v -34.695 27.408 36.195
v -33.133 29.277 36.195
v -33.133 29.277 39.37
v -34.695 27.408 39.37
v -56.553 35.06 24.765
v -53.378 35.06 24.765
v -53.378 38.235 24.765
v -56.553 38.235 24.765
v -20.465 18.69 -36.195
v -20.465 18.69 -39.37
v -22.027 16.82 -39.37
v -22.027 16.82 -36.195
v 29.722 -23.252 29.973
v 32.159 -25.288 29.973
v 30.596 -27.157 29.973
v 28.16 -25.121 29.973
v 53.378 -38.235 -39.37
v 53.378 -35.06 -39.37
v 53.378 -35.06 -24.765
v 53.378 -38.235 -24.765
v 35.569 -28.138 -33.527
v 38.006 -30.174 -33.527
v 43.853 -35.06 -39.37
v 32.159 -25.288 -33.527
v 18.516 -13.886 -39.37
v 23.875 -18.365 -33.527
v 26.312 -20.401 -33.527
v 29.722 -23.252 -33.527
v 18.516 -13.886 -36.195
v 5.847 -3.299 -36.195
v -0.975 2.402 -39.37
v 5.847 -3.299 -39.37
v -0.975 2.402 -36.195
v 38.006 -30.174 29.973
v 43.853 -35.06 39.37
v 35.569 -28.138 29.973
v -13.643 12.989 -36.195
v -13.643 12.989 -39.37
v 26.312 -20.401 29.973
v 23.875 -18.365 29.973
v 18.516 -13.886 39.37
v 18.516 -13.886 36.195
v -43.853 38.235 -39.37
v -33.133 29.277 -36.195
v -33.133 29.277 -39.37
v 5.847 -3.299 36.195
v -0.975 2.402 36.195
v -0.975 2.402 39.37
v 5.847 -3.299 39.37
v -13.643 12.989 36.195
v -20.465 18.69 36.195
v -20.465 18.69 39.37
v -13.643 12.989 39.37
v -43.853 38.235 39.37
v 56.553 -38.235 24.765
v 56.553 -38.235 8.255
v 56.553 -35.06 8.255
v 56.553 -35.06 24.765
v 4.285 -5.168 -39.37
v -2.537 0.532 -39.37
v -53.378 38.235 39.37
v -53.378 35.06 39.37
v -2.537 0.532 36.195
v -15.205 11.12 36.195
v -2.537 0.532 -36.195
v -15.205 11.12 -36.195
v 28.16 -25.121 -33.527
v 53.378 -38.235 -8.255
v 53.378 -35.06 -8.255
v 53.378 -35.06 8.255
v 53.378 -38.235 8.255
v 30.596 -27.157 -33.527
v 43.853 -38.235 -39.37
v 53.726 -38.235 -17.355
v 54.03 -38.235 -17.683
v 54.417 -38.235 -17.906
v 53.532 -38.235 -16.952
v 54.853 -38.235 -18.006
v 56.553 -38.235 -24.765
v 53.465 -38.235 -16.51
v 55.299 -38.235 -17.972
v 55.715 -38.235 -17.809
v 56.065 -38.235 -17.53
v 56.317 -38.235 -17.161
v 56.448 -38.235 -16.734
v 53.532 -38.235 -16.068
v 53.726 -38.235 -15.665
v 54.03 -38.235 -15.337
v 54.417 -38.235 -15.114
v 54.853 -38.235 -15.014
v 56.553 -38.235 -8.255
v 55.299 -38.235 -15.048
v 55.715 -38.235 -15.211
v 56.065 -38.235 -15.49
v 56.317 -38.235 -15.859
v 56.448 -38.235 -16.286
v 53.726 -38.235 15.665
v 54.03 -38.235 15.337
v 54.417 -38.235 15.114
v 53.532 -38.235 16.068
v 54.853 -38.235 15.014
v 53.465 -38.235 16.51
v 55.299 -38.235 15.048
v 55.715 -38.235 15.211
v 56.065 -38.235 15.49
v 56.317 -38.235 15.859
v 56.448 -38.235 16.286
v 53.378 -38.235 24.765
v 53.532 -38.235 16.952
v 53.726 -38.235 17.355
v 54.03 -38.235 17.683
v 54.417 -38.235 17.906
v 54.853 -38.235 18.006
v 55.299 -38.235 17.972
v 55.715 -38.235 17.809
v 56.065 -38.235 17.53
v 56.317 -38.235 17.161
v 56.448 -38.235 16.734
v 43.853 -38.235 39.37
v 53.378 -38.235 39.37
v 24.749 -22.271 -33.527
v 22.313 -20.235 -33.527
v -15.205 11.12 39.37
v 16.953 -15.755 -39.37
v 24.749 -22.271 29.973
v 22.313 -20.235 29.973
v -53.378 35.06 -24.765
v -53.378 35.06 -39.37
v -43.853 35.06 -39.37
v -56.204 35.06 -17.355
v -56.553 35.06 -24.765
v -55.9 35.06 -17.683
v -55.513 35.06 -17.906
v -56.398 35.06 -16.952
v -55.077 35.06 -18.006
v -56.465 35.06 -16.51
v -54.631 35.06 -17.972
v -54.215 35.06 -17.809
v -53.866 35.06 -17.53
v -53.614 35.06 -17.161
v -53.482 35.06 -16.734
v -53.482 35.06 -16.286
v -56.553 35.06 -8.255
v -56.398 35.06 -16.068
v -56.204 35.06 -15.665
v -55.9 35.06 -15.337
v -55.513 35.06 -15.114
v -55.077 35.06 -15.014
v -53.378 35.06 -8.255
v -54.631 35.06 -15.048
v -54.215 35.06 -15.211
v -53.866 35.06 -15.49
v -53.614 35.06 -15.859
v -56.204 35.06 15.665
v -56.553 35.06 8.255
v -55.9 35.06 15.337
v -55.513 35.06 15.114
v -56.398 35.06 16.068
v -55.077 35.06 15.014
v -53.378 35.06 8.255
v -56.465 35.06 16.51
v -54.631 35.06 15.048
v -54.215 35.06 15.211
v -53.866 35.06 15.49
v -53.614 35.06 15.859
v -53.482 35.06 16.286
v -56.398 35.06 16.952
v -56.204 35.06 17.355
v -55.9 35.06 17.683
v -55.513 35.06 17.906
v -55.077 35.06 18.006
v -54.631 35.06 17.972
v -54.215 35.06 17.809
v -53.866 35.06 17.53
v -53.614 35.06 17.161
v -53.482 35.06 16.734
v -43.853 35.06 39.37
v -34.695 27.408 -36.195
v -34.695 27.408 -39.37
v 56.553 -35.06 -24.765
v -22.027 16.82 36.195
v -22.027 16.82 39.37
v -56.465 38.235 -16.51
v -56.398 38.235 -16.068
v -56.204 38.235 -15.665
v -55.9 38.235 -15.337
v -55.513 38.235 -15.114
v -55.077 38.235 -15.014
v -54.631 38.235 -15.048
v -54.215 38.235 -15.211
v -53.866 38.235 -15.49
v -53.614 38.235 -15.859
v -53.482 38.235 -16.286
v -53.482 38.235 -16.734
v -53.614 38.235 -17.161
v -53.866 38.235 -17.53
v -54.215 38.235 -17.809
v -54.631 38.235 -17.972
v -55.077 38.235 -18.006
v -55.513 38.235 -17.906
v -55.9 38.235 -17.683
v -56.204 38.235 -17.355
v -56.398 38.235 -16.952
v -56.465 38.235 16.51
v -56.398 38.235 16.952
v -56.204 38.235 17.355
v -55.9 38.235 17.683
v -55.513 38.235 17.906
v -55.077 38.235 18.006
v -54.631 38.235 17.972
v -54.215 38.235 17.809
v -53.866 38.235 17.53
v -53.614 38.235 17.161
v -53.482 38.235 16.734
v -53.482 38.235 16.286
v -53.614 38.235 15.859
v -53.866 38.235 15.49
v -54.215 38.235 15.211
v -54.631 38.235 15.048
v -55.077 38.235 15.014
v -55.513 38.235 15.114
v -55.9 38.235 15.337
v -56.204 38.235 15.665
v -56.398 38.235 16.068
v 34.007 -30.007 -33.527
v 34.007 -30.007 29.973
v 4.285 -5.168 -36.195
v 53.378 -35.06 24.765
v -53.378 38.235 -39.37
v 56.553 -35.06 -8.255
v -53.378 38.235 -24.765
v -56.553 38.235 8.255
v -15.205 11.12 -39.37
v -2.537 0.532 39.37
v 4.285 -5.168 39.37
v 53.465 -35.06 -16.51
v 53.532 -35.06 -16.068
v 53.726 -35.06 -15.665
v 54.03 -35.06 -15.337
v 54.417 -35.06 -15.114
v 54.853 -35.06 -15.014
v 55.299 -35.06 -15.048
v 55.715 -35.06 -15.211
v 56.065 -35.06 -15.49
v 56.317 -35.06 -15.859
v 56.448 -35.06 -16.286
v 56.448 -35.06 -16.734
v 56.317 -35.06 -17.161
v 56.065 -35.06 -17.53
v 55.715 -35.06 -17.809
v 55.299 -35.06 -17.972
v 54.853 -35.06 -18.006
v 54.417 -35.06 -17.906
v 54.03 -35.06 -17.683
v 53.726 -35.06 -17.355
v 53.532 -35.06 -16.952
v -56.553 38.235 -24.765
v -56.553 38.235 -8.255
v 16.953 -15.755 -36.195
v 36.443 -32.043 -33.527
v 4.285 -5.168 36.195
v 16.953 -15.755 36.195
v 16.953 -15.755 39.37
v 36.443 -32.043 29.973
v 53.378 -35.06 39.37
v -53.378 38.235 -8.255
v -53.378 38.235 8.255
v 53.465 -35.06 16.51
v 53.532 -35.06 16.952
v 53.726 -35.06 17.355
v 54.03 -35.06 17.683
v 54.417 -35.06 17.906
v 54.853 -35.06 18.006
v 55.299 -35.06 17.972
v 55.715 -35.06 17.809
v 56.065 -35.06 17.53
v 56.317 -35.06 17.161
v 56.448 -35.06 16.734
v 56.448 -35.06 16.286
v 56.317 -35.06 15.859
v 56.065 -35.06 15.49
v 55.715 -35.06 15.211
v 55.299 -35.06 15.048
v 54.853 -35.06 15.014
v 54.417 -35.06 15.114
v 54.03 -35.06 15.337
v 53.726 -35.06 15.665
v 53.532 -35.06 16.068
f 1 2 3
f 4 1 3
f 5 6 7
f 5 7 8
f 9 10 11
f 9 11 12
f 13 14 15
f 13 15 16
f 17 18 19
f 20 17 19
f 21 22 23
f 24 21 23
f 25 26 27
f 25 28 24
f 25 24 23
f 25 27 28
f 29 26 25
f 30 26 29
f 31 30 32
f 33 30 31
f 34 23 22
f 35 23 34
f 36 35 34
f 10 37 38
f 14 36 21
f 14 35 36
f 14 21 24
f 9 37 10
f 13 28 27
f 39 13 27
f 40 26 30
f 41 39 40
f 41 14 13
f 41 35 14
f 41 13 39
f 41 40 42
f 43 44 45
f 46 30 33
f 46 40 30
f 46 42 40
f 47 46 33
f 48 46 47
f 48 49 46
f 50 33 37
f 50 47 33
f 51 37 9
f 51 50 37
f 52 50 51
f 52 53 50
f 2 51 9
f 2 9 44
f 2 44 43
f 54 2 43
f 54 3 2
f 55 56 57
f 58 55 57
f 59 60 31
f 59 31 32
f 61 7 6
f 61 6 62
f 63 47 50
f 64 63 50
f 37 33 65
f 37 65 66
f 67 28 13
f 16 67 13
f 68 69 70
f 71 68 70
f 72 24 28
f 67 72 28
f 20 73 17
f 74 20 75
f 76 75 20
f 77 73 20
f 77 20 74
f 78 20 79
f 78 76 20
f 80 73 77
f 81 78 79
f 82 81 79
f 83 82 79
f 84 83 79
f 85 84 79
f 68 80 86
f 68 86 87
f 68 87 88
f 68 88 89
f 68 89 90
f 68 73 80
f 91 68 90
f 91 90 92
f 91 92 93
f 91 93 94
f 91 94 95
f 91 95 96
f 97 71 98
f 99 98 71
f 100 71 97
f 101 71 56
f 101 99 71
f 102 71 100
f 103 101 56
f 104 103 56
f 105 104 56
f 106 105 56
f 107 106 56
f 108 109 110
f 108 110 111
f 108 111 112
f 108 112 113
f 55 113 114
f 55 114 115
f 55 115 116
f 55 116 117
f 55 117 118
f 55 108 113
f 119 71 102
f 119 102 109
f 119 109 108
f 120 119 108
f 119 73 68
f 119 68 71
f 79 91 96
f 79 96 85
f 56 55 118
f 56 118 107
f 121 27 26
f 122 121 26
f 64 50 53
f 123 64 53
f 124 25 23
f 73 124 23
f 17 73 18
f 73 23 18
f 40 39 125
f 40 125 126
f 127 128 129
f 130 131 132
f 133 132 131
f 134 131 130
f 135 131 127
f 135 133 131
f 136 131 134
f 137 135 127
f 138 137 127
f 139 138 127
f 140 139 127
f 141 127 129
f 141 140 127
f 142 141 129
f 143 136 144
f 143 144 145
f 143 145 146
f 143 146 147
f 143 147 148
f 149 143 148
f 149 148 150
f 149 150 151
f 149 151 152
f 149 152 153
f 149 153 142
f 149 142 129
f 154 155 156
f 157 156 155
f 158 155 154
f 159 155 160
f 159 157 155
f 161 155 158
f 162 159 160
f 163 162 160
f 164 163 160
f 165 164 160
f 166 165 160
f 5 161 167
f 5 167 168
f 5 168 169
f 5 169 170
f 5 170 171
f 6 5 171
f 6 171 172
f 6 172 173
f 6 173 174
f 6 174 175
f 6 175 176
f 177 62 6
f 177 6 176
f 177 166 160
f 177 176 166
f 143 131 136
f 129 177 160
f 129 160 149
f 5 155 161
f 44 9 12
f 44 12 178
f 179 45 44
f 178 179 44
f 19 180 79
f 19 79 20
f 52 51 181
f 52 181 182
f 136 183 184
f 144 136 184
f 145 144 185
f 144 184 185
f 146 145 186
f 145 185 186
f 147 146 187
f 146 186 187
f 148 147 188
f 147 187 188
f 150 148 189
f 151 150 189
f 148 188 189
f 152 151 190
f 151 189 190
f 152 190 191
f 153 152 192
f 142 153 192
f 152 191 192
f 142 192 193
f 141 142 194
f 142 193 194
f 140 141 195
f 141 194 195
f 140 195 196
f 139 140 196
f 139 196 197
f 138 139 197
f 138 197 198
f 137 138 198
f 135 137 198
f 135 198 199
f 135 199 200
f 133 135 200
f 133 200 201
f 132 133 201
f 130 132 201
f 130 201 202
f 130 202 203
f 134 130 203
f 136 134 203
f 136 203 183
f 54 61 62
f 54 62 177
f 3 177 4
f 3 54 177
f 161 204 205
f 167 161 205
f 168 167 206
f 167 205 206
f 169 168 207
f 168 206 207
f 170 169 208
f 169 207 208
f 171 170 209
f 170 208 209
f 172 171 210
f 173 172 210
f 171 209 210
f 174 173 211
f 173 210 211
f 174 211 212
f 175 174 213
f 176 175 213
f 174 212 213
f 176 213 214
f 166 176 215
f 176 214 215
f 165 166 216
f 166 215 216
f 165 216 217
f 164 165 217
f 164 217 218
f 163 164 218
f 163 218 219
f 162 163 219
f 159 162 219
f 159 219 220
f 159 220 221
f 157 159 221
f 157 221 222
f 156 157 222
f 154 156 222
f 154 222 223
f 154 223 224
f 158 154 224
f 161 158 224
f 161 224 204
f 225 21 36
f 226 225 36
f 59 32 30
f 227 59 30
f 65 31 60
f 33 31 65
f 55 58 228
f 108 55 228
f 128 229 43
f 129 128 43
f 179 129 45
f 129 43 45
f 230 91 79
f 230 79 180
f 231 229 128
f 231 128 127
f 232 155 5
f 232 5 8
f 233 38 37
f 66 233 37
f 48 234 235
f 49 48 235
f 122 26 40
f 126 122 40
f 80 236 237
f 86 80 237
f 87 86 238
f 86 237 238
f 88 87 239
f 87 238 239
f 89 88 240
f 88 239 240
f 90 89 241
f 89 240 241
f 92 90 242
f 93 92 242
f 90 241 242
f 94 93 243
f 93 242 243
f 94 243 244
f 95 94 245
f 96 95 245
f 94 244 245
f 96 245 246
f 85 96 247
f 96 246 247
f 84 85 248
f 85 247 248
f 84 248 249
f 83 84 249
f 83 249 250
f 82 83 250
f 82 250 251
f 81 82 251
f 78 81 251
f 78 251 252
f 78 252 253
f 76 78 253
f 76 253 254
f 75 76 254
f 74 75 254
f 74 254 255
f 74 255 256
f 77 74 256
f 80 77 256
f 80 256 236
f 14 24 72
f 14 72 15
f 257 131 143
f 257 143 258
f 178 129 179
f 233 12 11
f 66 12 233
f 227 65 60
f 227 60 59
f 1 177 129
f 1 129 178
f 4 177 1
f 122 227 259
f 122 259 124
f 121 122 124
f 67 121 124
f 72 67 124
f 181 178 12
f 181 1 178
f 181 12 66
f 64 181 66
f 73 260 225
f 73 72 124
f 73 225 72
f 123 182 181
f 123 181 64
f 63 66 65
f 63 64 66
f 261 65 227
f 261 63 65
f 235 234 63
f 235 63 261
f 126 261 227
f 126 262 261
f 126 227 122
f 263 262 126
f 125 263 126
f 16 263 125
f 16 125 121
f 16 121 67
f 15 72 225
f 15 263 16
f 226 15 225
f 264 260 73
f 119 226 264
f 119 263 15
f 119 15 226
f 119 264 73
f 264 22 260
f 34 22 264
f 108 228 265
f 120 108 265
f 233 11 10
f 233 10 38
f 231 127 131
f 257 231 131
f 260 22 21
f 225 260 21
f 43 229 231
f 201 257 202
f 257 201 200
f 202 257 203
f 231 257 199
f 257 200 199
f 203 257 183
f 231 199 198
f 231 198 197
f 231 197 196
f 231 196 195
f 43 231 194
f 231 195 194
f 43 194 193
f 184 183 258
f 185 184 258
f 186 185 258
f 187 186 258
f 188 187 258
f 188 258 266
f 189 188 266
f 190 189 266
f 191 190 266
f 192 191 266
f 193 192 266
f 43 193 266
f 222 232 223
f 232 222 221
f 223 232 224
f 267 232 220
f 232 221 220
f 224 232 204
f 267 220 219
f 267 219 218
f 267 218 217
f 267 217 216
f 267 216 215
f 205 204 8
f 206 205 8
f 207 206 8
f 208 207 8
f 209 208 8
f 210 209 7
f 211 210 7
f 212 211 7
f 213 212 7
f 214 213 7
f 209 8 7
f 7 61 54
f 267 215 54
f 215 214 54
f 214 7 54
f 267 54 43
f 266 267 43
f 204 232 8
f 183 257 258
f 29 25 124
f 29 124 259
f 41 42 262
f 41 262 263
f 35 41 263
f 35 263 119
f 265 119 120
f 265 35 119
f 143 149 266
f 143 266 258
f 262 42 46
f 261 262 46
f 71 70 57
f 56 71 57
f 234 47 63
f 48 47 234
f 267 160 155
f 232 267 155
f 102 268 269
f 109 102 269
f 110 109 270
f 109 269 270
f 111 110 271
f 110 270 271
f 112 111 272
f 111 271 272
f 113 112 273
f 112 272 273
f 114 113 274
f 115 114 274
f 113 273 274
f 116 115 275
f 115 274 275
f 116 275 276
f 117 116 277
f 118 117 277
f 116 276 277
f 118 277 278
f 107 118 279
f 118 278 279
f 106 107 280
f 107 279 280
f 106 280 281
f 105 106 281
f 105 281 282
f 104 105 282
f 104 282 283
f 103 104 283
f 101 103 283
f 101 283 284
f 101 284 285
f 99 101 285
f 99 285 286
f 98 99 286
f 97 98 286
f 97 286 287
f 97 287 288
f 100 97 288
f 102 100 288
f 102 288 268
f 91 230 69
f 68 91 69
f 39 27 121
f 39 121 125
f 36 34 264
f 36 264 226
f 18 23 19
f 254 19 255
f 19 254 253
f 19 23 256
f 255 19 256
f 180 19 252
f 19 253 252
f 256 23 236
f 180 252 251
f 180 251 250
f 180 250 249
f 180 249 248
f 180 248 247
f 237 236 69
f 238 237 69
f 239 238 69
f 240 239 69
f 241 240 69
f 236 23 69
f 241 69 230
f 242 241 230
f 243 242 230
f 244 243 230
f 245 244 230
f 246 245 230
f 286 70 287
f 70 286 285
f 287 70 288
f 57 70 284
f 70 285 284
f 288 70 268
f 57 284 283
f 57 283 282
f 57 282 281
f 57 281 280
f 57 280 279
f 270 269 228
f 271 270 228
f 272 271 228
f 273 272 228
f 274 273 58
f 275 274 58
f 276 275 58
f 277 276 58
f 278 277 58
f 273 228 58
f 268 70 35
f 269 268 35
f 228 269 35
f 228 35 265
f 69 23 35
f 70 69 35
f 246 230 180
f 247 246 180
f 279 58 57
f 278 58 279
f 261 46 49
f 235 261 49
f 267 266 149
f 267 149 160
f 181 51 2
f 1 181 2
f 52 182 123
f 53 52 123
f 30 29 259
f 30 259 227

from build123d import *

# Parameters (mm, degrees)
F0_W     = 12.7
F0_H     = 3.175
F1_DEPTH = 39.37
F2_W     = 3.175
F2_H     = 14.605
F2_H_2   = 16.51
F2_R     = 1.5
F3_DEPTH = 25.4
F4_W     = 3.175
F4_H     = 14.605
F4_R     = 1.5
F5_DEPTH = 25.4
F6_W     = 3.175
F6_H     = 63.5
F6_W_2   = 16.51
F6_H_2   = 3.175
F7_DEPTH = 25.4


with BuildPart() as f1:
    # F0 (on Top) → F1 (new body, symmetric)
    with BuildSketch(Plane.XY):
        with Locations((-50.2026024774, 36.647943407)):
            Rectangle(F0_W, F0_H)
        Polygon((-43.8526024774, 38.235443407), (-43.8526024774, 35.060443407), (43.8526024774, -38.235443407), (43.8526024774, -35.060443407), align=None)
        with Locations((50.2026024774, -36.647943407)):
            Rectangle(F0_W, F0_H)
    extrude(amount=F1_DEPTH, both=True)

    # F2 (on face) → F3 (cut)
    with BuildSketch(Plane(origin=(0, 38.235443407, 0), x_dir=(-1, 0, 0), z_dir=(0, 1, 0))):
        with Locations((54.9651024774, 32.0675)):
            Rectangle(F2_W, F2_H)
        with Locations((54.9651024774, 0)):
            Rectangle(F2_W, F2_H_2)
        with Locations((54.9651024774, -32.0675)):
            Rectangle(F2_W, F2_H)
        with Locations((54.9651024774, 16.51)):
            Circle(F2_R)
        with Locations((54.9651024774, -16.51)):
            Circle(F2_R)
    extrude(amount=-F3_DEPTH, mode=Mode.SUBTRACT)

    # F4 (on face) → F5 (cut)
    with BuildSketch(Plane(origin=(0, -35.060443407, 0), x_dir=(-1, 0, 0), z_dir=(0, 1, 0))):
        with Locations((-54.9651024774, 32.0675)):
            Rectangle(F4_W, F4_H)
        with Locations((-54.9651024774, -32.0675)):
            Rectangle(F4_W, F4_H)
        Polygon((-56.5526024774, 8.255), (-56.5526024774, 0), (-56.5526024774, -8.255), (-53.3776024774, -8.255), (-53.3776024774, 8.255), align=None)
        with Locations((-54.9651024774, 16.51)):
            Circle(F4_R)
        with Locations((-54.9651024774, -16.51)):
            Circle(F4_R)
    extrude(amount=-F5_DEPTH, mode=Mode.SUBTRACT)

    # F6 (on face) → F7 (cut)
    with BuildSketch(Plane(origin=(0.7811352648, 0.9346994965, 0), x_dir=(-0.7673246278, 0.6412588523, 0), z_dir=(0.6412588523, 0.7673246278, 0))):
        with Locations((-31.684501572, -1.7767186165)):
            Rectangle(F6_W, F6_H)
        with Locations((-39.304501572, -1.7767186165)):
            Rectangle(F6_W, F6_H)
        with Locations((-46.924501572, -1.7767186165)):
            Rectangle(F6_W, F6_H)
        with Locations((35.942998428, 37.7825)):
            Rectangle(F6_W_2, F6_H_2)
        with Locations((10.542998428, 37.7825)):
            Rectangle(F6_W_2, F6_H_2)
        with Locations((-14.857001572, 37.7825)):
            Rectangle(F6_W_2, F6_H_2)
        with Locations((35.942998428, -37.7825)):
            Rectangle(F6_W_2, F6_H_2)
        with Locations((10.542998428, -37.7825)):
            Rectangle(F6_W_2, F6_H_2)
        with Locations((-14.857001572, -37.7825)):
            Rectangle(F6_W_2, F6_H_2)
    extrude(amount=-F7_DEPTH, mode=Mode.SUBTRACT)


solid = f1.part
